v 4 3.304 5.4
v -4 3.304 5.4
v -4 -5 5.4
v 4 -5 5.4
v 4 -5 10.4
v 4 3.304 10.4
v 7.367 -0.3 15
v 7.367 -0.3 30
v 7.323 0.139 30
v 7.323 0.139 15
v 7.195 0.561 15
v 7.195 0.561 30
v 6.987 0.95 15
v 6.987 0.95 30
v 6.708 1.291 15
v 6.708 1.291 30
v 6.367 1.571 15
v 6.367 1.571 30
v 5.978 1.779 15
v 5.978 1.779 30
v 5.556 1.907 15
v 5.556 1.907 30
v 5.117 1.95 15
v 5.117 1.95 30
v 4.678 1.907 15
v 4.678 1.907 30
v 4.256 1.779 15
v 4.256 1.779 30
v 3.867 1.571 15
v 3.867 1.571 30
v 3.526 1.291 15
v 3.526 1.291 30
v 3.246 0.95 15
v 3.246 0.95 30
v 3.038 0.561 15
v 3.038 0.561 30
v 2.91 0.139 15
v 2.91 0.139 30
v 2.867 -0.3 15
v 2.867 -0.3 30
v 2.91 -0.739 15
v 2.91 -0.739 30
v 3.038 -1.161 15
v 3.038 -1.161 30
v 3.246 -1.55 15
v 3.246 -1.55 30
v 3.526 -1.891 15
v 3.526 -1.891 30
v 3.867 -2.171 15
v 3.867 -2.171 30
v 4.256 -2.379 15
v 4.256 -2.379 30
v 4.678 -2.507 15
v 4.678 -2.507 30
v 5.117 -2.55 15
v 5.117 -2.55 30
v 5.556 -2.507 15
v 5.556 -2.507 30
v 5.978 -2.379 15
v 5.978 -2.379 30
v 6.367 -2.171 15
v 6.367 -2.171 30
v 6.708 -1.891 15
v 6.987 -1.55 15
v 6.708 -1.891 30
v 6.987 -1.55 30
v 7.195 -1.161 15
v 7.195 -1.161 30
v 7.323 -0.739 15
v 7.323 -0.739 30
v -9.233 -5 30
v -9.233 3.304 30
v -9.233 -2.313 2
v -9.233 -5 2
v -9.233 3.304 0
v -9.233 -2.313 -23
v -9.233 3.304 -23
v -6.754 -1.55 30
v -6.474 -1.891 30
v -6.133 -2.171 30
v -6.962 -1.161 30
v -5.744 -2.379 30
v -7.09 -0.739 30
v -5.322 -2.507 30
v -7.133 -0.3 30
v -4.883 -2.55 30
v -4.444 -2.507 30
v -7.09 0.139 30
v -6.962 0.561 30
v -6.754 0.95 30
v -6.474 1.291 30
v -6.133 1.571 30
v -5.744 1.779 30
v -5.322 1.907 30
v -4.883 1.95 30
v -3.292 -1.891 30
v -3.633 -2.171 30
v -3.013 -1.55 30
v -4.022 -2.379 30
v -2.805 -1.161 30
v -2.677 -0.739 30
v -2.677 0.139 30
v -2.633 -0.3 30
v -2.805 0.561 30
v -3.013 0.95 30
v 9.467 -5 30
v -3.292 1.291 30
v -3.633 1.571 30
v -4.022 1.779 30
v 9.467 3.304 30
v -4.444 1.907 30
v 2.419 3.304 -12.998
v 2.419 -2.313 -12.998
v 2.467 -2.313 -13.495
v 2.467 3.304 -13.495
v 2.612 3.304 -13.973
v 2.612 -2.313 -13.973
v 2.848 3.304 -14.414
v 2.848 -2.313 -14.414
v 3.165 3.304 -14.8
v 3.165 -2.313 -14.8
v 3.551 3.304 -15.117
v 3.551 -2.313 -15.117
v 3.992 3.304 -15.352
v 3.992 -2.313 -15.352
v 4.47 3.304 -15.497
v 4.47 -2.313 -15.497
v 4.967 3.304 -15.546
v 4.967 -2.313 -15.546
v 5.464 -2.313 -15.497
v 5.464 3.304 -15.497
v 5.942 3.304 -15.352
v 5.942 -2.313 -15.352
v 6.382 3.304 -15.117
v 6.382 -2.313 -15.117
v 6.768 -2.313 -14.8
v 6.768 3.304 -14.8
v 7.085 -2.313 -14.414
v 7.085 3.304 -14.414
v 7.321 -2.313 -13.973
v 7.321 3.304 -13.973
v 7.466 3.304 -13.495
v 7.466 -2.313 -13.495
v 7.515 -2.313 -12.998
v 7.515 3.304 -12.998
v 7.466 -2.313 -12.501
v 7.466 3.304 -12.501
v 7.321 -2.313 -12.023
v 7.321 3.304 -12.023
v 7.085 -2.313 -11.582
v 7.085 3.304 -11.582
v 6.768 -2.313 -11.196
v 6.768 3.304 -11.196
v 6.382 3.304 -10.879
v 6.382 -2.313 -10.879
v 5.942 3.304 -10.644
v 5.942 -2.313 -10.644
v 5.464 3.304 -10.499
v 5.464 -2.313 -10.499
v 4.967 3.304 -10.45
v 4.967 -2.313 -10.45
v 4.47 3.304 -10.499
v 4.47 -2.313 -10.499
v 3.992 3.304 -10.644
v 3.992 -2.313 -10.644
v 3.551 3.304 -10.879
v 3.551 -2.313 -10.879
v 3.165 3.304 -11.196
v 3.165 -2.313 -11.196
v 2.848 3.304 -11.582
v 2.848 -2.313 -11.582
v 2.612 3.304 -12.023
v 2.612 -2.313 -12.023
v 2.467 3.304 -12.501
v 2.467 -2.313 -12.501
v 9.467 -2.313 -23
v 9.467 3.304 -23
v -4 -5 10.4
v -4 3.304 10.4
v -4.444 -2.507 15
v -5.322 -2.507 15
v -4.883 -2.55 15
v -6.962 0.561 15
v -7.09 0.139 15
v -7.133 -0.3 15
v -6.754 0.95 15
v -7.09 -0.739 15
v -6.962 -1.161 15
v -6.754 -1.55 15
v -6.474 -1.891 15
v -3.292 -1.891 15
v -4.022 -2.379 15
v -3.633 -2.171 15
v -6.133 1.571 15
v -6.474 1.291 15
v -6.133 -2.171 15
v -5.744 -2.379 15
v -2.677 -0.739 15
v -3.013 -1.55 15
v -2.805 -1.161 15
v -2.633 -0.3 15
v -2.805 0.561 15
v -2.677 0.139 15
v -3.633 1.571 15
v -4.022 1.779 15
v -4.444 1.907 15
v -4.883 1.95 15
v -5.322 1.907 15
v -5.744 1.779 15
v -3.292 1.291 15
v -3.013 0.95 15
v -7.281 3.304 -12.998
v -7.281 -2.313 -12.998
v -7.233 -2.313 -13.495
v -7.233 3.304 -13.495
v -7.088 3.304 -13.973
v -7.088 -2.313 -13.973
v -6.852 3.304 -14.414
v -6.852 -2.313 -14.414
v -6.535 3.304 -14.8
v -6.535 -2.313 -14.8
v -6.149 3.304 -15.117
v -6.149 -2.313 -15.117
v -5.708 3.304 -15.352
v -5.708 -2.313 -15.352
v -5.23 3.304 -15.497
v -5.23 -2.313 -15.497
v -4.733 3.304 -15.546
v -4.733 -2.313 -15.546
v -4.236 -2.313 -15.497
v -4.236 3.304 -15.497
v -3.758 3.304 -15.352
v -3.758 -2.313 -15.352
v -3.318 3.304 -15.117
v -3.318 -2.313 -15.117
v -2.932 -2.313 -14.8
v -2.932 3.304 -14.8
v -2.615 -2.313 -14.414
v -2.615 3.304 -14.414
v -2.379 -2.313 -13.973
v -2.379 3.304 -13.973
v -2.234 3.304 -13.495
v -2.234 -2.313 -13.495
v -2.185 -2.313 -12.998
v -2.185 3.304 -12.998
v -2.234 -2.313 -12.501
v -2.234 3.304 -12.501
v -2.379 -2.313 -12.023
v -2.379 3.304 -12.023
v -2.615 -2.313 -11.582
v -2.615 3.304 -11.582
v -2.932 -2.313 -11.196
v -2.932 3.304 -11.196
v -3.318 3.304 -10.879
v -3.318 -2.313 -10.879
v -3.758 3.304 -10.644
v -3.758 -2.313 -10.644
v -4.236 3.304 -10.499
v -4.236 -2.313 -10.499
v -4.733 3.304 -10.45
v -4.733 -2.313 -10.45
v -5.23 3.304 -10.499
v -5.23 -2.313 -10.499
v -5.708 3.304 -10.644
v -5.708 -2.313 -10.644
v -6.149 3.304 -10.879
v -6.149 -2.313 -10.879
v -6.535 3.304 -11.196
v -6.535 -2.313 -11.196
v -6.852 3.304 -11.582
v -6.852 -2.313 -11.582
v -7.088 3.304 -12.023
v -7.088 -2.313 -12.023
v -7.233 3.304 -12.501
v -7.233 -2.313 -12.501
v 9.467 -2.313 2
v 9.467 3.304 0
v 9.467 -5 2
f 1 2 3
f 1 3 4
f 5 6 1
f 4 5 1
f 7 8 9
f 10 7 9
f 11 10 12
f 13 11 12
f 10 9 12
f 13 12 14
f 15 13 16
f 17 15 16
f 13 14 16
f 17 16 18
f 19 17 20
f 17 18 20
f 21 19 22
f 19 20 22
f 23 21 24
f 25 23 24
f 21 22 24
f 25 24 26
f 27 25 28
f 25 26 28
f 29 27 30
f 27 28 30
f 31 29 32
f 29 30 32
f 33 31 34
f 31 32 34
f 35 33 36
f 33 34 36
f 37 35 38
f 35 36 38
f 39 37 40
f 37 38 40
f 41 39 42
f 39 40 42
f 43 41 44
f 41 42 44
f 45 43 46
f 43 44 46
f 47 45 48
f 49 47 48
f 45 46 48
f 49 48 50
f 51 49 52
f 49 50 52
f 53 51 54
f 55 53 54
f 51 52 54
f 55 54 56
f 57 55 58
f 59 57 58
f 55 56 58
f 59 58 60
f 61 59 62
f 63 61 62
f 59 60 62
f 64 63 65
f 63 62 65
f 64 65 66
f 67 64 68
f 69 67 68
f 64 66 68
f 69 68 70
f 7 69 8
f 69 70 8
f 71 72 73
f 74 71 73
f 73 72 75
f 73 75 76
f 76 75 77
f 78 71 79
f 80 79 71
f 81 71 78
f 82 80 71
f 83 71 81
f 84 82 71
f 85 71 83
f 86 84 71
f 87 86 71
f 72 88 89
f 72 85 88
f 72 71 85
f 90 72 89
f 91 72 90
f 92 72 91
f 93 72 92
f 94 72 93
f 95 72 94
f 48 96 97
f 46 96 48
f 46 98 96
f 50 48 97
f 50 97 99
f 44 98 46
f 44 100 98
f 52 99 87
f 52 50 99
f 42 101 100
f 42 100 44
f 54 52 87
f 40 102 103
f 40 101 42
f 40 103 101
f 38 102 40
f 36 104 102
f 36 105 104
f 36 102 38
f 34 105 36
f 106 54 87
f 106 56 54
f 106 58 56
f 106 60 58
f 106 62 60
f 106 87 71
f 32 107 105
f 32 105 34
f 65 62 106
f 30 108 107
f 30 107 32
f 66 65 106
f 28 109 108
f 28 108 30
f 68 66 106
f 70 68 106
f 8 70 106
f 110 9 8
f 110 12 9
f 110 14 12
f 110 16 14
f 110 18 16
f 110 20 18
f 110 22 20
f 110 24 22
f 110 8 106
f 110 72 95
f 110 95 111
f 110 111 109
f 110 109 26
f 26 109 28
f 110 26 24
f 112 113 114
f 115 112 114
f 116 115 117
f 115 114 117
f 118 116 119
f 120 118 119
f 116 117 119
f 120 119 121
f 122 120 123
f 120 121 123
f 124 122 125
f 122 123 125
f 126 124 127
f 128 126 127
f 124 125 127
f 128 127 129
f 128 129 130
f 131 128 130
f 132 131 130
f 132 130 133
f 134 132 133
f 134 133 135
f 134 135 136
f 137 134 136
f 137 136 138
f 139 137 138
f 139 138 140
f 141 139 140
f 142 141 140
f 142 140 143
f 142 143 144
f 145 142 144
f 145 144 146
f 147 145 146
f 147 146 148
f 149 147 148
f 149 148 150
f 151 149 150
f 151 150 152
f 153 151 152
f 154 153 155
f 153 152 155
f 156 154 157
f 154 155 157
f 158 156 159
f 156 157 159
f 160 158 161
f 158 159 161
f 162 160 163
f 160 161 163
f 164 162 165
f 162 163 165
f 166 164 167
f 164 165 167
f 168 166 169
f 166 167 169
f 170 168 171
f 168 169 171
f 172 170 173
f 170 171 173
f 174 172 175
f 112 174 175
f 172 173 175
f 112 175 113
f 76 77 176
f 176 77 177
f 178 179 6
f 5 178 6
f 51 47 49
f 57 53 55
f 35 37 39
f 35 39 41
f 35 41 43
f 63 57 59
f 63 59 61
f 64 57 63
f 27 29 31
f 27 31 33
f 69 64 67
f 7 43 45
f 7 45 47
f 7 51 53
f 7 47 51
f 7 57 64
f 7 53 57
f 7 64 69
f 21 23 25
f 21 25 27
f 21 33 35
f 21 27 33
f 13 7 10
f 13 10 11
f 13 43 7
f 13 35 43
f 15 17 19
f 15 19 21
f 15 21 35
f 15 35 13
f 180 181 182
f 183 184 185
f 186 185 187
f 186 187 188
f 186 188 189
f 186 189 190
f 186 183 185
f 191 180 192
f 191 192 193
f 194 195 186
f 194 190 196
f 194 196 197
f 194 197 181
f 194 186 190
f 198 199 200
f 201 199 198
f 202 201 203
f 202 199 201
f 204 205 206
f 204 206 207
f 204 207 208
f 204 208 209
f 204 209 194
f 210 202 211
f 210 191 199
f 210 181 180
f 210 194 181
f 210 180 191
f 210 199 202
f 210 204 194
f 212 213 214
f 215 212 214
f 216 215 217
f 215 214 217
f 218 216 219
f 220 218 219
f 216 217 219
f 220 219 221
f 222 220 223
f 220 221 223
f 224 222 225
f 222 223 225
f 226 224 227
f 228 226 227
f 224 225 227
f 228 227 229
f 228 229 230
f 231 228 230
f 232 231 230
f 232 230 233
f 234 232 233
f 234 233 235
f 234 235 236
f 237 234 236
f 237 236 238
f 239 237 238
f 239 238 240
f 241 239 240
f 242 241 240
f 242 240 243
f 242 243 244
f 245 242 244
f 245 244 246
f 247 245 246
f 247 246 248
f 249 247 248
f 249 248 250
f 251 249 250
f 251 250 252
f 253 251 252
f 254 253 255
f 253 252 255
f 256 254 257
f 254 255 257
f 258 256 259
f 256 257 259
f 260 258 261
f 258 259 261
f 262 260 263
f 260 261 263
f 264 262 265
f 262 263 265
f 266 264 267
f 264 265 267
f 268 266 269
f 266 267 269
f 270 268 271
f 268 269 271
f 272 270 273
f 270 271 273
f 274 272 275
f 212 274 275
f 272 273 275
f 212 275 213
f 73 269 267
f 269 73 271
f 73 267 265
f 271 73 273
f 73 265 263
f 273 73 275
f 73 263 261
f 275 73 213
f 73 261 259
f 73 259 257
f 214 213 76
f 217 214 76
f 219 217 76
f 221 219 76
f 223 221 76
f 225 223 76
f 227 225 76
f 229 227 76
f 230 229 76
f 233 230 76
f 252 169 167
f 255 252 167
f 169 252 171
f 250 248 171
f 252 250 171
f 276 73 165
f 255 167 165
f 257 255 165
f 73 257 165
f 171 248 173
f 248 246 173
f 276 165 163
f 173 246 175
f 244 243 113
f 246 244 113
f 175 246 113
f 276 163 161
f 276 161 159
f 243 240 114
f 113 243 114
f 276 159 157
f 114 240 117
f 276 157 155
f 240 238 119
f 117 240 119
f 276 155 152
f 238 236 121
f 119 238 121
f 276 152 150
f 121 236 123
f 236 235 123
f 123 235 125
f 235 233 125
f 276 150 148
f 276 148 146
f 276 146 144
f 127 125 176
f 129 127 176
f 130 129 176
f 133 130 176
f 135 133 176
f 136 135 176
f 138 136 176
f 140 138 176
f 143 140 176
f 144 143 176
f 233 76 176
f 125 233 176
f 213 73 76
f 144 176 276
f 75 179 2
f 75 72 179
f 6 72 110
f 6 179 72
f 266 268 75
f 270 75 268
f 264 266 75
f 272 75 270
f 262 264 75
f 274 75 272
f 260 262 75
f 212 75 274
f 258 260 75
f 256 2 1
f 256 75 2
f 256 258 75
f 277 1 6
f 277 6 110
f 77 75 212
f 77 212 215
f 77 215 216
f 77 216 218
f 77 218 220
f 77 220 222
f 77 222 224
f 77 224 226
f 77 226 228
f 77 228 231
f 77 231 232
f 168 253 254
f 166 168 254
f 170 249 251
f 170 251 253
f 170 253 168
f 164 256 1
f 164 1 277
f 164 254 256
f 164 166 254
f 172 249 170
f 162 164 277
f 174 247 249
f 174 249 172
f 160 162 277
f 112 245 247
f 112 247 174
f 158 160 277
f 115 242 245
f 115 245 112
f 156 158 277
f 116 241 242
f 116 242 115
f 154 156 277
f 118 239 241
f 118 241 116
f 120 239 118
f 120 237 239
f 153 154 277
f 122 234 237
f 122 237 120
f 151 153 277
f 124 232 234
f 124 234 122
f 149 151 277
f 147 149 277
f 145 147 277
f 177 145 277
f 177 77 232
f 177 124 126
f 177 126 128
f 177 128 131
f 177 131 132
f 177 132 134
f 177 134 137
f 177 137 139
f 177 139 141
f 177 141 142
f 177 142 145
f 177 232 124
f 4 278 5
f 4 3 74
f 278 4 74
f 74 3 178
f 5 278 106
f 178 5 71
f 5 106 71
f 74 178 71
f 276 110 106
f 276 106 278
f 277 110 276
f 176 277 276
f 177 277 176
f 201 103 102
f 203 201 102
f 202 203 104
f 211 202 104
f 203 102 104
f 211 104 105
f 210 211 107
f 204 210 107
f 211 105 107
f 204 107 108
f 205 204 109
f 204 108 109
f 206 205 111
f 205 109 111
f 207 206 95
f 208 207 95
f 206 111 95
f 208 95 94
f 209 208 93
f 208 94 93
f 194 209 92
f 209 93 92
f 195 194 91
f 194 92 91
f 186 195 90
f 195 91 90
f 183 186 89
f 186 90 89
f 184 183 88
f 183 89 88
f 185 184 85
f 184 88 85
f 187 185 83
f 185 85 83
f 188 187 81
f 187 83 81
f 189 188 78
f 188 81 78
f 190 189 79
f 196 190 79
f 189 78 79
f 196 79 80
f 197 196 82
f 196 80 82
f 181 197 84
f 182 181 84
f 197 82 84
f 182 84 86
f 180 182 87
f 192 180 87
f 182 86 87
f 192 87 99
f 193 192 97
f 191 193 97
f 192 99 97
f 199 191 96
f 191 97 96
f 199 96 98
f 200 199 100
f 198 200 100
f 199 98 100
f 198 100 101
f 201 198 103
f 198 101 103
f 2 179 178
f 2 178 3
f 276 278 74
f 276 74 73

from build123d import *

# Parameters (mm, degrees)
SKETCH_1_W           = 22.333333334
SKETCH_1_H           = 10
EXTRUDE_1_DEPTH      = 30
SKETCH_4_W           = 1.083333334
SKETCH_4_H           = 30
CUT_EXTRUDE_1_DEPTH  = 30
SKETCH_3_R           = 2.25
CUT_EXTRUDE_2_DEPTH  = 15
SKETCH_5_OUTSIDE_W   = 30.87
SKETCH_5_OUTSIDE_H   = 19.62
SKETCH_5_OUTSIDE_W_2 = 18.7
SKETCH_5_OUTSIDE_H_2 = 8.315719237
CUT_EXTRUDE_3_DEPTH  = 30
SKETCH_10_W          = 18.7
SKETCH_10_H          = 8.304405234
EXTRUDE_2_DEPTH      = 18
SKETCH_11_W          = 20
SKETCH_11_H          = 2.687046706
CUT_EXTRUDE_5_DEPTH  = 36.702801011
CUT_EXTRUDE_6_DEPTH  = 32.955789688
SKETCH_13_W          = 18.7
SKETCH_13_H          = 5
EXTRUDE_3_DEPTH      = 5.617358528
SKETCH_14_W          = 8
SKETCH_14_H          = 5
CUT_EXTRUDE_7_DEPTH  = 33.535840608


with BuildPart() as part:
    # 草图1 → 凸台-拉伸1 (new body)
    with BuildSketch(Plane.XY):
        Rectangle(SKETCH_1_W, SKETCH_1_H)
    extrude(amount=EXTRUDE_1_DEPTH)

    # 草图4 → 切除-拉伸1 (cut)
    with BuildSketch(Plane.XZ.offset(5)):
        with Locations((-10.625, 15)):
            Rectangle(SKETCH_4_W, SKETCH_4_H)
    extrude(amount=-CUT_EXTRUDE_1_DEPTH, mode=Mode.SUBTRACT)

    # 草图3 → 切除-拉伸2 (cut)
    with BuildSketch(Plane.XY.offset(30)):
        with Locations((-4.883333333, -0.3)):
            Circle(SKETCH_3_R)
        with Locations((5.116666667, -0.3)):
            Circle(SKETCH_3_R)
    extrude(amount=-CUT_EXTRUDE_2_DEPTH, mode=Mode.SUBTRACT)

    # 草图5 outside → 切除-拉伸3 (cut)
    with BuildSketch(Plane.XY.offset(30)):
        with Locations((0.542, 0)):
            Rectangle(SKETCH_5_OUTSIDE_W, SKETCH_5_OUTSIDE_H)
        with Locations((0.116666667, -0.853454385)):
            Rectangle(SKETCH_5_OUTSIDE_W_2, SKETCH_5_OUTSIDE_H_2, mode=Mode.SUBTRACT)
    extrude(amount=-CUT_EXTRUDE_3_DEPTH, mode=Mode.SUBTRACT)

    # 草图10 → 凸台-拉伸2 (add)
    with BuildSketch(Plane(origin=(0, 0, 0), x_dir=(-1, 0, 0), z_dir=(0, 0, -1))):
        with Locations((-0.116666667, -0.847797383)):
            Rectangle(SKETCH_10_W, SKETCH_10_H)
    extrude(amount=EXTRUDE_2_DEPTH)

    # 草图11 → 切除-拉伸5 (cut, through all)
    with BuildSketch(Plane(origin=(9.466666667, 0, 0), x_dir=(0, 0, -1), z_dir=(1, 0, 0))):
        with Locations((8, -3.656476647)):
            Rectangle(SKETCH_11_W, SKETCH_11_H)
    extrude(amount=-CUT_EXTRUDE_5_DEPTH, mode=Mode.SUBTRACT)

    # 草图12 → 切除-拉伸6 (cut, through all)
    with BuildSketch(Plane.XZ.offset(2.312953294)):
        with BuildLine():
            ThreePointArc((-2.185193673, -12.99813966), (-4.733333333, -10.45), (-7.281472993, -12.99813966))
            Line((-7.281472993, -12.99813966), (-2.185193673, -12.99813966))
        make_face()
        with BuildLine():
            Line((-2.185193673, -12.99813966), (-7.281472993, -12.99813966))
            ThreePointArc((-7.281472993, -12.99813966), (-4.733333333, -15.54627932), (-2.185193673, -12.99813966))
        make_face()
        with BuildLine():
            ThreePointArc((7.514806327, -12.99813966), (4.966666667, -10.45), (2.418527007, -12.99813966))
            Line((2.418527007, -12.99813966), (7.514806327, -12.99813966))
        make_face()
        with BuildLine():
            Line((7.514806327, -12.99813966), (2.418527007, -12.99813966))
            ThreePointArc((2.418527007, -12.99813966), (4.966666667, -15.54627932), (7.514806327, -12.99813966))
        make_face()
    extrude(amount=-CUT_EXTRUDE_6_DEPTH, mode=Mode.SUBTRACT)

    # 草图13 → 凸台-拉伸3 (add)
    with BuildSketch(Plane(origin=(0, 3.304405234, 0), x_dir=(1, 0, 0), z_dir=(0, 1, 0))):
        with Locations((0.116666667, 20.5)):
            Rectangle(SKETCH_13_W, SKETCH_13_H)
    extrude(amount=-EXTRUDE_3_DEPTH)

    # 草图14 → 切除-拉伸7 (cut, through all)
    with BuildSketch(Plane(origin=(0, 3.304405234, 0), x_dir=(1, 0, 0), z_dir=(0, 1, 0))):
        with Locations((0, -7.9)):
            Rectangle(SKETCH_14_W, SKETCH_14_H)
    extrude(amount=-CUT_EXTRUDE_7_DEPTH, mode=Mode.SUBTRACT)


solid = part.part
